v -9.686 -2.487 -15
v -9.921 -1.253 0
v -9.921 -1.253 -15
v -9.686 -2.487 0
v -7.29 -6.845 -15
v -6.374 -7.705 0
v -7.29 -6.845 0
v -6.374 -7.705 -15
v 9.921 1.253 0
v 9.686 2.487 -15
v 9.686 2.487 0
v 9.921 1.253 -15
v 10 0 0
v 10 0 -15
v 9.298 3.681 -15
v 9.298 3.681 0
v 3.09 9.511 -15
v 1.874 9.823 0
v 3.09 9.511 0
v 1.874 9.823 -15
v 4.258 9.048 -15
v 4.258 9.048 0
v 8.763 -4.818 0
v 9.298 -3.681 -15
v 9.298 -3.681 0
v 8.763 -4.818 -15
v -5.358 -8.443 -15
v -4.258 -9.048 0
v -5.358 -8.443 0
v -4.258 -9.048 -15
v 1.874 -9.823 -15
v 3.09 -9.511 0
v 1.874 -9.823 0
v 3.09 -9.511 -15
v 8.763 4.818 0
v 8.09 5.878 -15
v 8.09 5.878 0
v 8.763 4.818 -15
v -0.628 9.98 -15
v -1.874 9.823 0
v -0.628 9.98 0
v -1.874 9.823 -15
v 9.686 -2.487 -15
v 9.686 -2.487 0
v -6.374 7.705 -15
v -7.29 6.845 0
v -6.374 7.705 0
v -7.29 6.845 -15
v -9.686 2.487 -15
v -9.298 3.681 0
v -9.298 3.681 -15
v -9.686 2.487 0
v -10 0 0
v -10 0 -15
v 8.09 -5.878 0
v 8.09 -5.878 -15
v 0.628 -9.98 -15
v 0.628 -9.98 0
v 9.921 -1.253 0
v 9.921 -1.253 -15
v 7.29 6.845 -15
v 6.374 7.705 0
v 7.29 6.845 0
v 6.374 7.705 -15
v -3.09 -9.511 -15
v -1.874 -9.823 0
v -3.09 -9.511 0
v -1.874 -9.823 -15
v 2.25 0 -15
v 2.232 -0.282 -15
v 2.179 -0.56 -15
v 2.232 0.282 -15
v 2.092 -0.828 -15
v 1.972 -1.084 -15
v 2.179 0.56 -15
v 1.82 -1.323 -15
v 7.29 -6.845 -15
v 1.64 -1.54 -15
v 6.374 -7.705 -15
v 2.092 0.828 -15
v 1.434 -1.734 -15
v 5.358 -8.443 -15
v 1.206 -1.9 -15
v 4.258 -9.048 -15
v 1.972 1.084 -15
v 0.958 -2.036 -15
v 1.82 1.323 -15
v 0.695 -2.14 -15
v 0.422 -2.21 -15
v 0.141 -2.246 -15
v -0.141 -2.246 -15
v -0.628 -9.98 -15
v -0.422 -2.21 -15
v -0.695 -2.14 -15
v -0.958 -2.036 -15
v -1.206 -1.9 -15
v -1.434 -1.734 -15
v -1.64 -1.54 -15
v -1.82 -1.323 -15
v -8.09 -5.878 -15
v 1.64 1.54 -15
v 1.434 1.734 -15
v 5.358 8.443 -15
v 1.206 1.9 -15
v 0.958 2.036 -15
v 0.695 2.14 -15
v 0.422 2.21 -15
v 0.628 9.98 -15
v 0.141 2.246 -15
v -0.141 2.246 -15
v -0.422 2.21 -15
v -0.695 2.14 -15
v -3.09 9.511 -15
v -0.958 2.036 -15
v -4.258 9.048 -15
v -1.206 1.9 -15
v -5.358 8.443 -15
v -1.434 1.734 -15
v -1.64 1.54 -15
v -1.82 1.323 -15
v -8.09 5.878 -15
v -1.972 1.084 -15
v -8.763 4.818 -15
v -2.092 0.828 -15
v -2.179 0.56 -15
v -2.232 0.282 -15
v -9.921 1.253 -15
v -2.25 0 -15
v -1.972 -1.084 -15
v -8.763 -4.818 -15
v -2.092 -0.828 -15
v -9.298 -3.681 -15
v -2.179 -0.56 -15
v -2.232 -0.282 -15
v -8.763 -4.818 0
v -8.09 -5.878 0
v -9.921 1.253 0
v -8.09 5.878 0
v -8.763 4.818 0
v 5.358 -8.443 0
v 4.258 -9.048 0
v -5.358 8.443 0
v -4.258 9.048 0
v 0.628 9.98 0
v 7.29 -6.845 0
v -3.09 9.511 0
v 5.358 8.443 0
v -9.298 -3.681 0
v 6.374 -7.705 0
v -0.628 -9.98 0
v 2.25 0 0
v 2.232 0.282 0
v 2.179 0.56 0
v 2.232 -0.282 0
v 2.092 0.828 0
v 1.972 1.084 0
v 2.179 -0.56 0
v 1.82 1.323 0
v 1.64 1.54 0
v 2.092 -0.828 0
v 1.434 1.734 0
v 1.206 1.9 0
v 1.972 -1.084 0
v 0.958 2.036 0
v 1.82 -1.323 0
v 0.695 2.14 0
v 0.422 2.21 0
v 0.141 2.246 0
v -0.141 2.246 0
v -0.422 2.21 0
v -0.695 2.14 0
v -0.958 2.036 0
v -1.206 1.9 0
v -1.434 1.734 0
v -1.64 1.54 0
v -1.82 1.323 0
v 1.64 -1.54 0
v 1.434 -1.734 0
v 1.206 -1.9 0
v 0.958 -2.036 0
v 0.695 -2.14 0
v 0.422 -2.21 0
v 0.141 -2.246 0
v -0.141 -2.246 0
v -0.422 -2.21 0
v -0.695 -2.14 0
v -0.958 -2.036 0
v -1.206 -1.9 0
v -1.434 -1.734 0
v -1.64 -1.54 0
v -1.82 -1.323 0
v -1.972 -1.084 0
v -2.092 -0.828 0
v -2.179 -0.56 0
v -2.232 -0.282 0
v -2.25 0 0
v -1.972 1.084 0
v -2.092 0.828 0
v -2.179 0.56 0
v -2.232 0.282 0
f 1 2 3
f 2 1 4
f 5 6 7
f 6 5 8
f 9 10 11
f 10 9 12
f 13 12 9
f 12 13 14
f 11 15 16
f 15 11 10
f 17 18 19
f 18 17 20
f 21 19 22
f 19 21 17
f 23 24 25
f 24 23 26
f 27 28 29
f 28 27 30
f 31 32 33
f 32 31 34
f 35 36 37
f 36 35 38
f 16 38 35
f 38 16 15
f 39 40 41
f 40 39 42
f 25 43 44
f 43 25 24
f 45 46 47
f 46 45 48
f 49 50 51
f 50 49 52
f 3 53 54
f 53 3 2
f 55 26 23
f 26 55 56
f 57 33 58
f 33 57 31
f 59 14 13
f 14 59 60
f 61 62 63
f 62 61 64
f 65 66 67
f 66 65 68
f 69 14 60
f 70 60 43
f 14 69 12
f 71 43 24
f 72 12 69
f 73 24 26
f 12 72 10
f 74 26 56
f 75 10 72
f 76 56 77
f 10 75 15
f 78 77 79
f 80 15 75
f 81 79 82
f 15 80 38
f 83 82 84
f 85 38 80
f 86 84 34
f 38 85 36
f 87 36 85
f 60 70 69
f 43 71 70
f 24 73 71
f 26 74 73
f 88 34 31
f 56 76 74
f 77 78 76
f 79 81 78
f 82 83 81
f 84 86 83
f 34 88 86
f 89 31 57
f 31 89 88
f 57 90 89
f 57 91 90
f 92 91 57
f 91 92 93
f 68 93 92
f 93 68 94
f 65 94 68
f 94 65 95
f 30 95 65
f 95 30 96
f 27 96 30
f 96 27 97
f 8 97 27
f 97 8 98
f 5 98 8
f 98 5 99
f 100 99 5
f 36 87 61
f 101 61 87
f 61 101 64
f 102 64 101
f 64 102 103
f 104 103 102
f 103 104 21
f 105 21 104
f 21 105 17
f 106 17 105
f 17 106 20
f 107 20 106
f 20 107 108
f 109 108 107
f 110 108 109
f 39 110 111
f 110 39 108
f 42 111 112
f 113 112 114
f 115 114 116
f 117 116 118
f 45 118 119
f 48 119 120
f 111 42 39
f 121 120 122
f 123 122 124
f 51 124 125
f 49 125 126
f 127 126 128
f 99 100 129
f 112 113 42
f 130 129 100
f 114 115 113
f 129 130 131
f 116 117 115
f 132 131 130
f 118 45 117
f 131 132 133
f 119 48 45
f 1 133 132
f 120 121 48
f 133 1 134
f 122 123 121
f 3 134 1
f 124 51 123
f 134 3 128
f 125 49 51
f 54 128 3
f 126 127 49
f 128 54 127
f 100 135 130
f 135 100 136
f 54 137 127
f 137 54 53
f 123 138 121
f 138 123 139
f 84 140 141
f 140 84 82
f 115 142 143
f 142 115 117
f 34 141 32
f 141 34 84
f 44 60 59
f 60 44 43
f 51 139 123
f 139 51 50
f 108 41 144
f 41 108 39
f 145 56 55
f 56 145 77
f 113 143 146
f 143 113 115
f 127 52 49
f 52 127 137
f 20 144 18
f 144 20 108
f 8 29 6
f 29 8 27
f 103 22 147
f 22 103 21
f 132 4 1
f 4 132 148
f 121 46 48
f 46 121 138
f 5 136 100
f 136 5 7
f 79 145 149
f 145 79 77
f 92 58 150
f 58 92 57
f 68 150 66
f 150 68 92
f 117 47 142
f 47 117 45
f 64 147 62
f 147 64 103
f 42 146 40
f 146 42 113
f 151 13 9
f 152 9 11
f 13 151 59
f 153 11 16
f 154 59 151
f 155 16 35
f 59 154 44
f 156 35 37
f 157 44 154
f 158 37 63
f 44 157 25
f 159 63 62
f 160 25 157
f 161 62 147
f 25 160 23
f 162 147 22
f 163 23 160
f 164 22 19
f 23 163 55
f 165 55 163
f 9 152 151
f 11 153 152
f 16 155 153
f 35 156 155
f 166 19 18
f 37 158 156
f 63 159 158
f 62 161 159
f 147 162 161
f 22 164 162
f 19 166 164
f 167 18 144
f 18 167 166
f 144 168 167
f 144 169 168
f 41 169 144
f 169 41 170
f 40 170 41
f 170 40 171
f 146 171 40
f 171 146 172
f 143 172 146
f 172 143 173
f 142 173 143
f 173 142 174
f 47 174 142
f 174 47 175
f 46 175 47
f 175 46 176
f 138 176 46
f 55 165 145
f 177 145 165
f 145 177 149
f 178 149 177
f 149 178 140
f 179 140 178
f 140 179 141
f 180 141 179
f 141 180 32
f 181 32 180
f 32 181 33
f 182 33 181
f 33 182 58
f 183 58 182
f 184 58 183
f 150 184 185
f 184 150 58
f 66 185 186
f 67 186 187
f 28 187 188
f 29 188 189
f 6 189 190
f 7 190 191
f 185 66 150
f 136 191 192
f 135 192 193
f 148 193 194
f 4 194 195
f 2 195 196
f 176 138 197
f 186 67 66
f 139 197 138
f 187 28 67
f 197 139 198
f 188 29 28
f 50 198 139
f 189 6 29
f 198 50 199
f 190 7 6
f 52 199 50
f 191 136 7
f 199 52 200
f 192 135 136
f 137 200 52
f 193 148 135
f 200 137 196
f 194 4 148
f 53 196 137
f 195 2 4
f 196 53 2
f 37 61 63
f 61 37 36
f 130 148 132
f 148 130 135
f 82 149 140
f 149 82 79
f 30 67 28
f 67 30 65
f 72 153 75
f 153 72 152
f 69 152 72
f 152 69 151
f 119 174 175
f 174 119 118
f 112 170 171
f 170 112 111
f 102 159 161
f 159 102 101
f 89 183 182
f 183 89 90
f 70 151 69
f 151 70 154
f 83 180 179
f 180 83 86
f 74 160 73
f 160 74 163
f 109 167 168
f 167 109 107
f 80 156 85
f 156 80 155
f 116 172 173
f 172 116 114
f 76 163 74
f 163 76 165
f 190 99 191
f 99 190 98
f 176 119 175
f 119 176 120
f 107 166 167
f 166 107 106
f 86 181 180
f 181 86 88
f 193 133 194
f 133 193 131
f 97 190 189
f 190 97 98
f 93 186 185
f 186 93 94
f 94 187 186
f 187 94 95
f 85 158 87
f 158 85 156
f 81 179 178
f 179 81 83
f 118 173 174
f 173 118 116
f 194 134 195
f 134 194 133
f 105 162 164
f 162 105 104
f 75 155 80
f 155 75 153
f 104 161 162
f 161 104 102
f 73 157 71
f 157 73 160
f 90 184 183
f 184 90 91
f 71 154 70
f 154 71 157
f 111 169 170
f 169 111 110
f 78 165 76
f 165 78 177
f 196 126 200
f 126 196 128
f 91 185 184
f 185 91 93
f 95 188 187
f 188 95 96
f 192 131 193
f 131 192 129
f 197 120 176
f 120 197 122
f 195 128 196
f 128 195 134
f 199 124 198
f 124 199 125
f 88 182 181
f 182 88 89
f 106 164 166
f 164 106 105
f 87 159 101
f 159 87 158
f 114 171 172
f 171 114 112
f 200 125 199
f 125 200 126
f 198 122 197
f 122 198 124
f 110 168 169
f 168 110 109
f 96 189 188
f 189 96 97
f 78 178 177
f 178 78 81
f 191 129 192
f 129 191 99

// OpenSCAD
$fn = 50;


difference() {
	union() {
		translate(v = [0, 0, -15.0000000000]) {
			cylinder(h = 15, r = 10.0000000000);
		}
		cylinder(h = 0, r = 19.0000000000);
	}
	union() {
		#translate(v = [0, 0, -15]) {
			cylinder(h = 15, r = 2.2500000000);
		}
	}
}
